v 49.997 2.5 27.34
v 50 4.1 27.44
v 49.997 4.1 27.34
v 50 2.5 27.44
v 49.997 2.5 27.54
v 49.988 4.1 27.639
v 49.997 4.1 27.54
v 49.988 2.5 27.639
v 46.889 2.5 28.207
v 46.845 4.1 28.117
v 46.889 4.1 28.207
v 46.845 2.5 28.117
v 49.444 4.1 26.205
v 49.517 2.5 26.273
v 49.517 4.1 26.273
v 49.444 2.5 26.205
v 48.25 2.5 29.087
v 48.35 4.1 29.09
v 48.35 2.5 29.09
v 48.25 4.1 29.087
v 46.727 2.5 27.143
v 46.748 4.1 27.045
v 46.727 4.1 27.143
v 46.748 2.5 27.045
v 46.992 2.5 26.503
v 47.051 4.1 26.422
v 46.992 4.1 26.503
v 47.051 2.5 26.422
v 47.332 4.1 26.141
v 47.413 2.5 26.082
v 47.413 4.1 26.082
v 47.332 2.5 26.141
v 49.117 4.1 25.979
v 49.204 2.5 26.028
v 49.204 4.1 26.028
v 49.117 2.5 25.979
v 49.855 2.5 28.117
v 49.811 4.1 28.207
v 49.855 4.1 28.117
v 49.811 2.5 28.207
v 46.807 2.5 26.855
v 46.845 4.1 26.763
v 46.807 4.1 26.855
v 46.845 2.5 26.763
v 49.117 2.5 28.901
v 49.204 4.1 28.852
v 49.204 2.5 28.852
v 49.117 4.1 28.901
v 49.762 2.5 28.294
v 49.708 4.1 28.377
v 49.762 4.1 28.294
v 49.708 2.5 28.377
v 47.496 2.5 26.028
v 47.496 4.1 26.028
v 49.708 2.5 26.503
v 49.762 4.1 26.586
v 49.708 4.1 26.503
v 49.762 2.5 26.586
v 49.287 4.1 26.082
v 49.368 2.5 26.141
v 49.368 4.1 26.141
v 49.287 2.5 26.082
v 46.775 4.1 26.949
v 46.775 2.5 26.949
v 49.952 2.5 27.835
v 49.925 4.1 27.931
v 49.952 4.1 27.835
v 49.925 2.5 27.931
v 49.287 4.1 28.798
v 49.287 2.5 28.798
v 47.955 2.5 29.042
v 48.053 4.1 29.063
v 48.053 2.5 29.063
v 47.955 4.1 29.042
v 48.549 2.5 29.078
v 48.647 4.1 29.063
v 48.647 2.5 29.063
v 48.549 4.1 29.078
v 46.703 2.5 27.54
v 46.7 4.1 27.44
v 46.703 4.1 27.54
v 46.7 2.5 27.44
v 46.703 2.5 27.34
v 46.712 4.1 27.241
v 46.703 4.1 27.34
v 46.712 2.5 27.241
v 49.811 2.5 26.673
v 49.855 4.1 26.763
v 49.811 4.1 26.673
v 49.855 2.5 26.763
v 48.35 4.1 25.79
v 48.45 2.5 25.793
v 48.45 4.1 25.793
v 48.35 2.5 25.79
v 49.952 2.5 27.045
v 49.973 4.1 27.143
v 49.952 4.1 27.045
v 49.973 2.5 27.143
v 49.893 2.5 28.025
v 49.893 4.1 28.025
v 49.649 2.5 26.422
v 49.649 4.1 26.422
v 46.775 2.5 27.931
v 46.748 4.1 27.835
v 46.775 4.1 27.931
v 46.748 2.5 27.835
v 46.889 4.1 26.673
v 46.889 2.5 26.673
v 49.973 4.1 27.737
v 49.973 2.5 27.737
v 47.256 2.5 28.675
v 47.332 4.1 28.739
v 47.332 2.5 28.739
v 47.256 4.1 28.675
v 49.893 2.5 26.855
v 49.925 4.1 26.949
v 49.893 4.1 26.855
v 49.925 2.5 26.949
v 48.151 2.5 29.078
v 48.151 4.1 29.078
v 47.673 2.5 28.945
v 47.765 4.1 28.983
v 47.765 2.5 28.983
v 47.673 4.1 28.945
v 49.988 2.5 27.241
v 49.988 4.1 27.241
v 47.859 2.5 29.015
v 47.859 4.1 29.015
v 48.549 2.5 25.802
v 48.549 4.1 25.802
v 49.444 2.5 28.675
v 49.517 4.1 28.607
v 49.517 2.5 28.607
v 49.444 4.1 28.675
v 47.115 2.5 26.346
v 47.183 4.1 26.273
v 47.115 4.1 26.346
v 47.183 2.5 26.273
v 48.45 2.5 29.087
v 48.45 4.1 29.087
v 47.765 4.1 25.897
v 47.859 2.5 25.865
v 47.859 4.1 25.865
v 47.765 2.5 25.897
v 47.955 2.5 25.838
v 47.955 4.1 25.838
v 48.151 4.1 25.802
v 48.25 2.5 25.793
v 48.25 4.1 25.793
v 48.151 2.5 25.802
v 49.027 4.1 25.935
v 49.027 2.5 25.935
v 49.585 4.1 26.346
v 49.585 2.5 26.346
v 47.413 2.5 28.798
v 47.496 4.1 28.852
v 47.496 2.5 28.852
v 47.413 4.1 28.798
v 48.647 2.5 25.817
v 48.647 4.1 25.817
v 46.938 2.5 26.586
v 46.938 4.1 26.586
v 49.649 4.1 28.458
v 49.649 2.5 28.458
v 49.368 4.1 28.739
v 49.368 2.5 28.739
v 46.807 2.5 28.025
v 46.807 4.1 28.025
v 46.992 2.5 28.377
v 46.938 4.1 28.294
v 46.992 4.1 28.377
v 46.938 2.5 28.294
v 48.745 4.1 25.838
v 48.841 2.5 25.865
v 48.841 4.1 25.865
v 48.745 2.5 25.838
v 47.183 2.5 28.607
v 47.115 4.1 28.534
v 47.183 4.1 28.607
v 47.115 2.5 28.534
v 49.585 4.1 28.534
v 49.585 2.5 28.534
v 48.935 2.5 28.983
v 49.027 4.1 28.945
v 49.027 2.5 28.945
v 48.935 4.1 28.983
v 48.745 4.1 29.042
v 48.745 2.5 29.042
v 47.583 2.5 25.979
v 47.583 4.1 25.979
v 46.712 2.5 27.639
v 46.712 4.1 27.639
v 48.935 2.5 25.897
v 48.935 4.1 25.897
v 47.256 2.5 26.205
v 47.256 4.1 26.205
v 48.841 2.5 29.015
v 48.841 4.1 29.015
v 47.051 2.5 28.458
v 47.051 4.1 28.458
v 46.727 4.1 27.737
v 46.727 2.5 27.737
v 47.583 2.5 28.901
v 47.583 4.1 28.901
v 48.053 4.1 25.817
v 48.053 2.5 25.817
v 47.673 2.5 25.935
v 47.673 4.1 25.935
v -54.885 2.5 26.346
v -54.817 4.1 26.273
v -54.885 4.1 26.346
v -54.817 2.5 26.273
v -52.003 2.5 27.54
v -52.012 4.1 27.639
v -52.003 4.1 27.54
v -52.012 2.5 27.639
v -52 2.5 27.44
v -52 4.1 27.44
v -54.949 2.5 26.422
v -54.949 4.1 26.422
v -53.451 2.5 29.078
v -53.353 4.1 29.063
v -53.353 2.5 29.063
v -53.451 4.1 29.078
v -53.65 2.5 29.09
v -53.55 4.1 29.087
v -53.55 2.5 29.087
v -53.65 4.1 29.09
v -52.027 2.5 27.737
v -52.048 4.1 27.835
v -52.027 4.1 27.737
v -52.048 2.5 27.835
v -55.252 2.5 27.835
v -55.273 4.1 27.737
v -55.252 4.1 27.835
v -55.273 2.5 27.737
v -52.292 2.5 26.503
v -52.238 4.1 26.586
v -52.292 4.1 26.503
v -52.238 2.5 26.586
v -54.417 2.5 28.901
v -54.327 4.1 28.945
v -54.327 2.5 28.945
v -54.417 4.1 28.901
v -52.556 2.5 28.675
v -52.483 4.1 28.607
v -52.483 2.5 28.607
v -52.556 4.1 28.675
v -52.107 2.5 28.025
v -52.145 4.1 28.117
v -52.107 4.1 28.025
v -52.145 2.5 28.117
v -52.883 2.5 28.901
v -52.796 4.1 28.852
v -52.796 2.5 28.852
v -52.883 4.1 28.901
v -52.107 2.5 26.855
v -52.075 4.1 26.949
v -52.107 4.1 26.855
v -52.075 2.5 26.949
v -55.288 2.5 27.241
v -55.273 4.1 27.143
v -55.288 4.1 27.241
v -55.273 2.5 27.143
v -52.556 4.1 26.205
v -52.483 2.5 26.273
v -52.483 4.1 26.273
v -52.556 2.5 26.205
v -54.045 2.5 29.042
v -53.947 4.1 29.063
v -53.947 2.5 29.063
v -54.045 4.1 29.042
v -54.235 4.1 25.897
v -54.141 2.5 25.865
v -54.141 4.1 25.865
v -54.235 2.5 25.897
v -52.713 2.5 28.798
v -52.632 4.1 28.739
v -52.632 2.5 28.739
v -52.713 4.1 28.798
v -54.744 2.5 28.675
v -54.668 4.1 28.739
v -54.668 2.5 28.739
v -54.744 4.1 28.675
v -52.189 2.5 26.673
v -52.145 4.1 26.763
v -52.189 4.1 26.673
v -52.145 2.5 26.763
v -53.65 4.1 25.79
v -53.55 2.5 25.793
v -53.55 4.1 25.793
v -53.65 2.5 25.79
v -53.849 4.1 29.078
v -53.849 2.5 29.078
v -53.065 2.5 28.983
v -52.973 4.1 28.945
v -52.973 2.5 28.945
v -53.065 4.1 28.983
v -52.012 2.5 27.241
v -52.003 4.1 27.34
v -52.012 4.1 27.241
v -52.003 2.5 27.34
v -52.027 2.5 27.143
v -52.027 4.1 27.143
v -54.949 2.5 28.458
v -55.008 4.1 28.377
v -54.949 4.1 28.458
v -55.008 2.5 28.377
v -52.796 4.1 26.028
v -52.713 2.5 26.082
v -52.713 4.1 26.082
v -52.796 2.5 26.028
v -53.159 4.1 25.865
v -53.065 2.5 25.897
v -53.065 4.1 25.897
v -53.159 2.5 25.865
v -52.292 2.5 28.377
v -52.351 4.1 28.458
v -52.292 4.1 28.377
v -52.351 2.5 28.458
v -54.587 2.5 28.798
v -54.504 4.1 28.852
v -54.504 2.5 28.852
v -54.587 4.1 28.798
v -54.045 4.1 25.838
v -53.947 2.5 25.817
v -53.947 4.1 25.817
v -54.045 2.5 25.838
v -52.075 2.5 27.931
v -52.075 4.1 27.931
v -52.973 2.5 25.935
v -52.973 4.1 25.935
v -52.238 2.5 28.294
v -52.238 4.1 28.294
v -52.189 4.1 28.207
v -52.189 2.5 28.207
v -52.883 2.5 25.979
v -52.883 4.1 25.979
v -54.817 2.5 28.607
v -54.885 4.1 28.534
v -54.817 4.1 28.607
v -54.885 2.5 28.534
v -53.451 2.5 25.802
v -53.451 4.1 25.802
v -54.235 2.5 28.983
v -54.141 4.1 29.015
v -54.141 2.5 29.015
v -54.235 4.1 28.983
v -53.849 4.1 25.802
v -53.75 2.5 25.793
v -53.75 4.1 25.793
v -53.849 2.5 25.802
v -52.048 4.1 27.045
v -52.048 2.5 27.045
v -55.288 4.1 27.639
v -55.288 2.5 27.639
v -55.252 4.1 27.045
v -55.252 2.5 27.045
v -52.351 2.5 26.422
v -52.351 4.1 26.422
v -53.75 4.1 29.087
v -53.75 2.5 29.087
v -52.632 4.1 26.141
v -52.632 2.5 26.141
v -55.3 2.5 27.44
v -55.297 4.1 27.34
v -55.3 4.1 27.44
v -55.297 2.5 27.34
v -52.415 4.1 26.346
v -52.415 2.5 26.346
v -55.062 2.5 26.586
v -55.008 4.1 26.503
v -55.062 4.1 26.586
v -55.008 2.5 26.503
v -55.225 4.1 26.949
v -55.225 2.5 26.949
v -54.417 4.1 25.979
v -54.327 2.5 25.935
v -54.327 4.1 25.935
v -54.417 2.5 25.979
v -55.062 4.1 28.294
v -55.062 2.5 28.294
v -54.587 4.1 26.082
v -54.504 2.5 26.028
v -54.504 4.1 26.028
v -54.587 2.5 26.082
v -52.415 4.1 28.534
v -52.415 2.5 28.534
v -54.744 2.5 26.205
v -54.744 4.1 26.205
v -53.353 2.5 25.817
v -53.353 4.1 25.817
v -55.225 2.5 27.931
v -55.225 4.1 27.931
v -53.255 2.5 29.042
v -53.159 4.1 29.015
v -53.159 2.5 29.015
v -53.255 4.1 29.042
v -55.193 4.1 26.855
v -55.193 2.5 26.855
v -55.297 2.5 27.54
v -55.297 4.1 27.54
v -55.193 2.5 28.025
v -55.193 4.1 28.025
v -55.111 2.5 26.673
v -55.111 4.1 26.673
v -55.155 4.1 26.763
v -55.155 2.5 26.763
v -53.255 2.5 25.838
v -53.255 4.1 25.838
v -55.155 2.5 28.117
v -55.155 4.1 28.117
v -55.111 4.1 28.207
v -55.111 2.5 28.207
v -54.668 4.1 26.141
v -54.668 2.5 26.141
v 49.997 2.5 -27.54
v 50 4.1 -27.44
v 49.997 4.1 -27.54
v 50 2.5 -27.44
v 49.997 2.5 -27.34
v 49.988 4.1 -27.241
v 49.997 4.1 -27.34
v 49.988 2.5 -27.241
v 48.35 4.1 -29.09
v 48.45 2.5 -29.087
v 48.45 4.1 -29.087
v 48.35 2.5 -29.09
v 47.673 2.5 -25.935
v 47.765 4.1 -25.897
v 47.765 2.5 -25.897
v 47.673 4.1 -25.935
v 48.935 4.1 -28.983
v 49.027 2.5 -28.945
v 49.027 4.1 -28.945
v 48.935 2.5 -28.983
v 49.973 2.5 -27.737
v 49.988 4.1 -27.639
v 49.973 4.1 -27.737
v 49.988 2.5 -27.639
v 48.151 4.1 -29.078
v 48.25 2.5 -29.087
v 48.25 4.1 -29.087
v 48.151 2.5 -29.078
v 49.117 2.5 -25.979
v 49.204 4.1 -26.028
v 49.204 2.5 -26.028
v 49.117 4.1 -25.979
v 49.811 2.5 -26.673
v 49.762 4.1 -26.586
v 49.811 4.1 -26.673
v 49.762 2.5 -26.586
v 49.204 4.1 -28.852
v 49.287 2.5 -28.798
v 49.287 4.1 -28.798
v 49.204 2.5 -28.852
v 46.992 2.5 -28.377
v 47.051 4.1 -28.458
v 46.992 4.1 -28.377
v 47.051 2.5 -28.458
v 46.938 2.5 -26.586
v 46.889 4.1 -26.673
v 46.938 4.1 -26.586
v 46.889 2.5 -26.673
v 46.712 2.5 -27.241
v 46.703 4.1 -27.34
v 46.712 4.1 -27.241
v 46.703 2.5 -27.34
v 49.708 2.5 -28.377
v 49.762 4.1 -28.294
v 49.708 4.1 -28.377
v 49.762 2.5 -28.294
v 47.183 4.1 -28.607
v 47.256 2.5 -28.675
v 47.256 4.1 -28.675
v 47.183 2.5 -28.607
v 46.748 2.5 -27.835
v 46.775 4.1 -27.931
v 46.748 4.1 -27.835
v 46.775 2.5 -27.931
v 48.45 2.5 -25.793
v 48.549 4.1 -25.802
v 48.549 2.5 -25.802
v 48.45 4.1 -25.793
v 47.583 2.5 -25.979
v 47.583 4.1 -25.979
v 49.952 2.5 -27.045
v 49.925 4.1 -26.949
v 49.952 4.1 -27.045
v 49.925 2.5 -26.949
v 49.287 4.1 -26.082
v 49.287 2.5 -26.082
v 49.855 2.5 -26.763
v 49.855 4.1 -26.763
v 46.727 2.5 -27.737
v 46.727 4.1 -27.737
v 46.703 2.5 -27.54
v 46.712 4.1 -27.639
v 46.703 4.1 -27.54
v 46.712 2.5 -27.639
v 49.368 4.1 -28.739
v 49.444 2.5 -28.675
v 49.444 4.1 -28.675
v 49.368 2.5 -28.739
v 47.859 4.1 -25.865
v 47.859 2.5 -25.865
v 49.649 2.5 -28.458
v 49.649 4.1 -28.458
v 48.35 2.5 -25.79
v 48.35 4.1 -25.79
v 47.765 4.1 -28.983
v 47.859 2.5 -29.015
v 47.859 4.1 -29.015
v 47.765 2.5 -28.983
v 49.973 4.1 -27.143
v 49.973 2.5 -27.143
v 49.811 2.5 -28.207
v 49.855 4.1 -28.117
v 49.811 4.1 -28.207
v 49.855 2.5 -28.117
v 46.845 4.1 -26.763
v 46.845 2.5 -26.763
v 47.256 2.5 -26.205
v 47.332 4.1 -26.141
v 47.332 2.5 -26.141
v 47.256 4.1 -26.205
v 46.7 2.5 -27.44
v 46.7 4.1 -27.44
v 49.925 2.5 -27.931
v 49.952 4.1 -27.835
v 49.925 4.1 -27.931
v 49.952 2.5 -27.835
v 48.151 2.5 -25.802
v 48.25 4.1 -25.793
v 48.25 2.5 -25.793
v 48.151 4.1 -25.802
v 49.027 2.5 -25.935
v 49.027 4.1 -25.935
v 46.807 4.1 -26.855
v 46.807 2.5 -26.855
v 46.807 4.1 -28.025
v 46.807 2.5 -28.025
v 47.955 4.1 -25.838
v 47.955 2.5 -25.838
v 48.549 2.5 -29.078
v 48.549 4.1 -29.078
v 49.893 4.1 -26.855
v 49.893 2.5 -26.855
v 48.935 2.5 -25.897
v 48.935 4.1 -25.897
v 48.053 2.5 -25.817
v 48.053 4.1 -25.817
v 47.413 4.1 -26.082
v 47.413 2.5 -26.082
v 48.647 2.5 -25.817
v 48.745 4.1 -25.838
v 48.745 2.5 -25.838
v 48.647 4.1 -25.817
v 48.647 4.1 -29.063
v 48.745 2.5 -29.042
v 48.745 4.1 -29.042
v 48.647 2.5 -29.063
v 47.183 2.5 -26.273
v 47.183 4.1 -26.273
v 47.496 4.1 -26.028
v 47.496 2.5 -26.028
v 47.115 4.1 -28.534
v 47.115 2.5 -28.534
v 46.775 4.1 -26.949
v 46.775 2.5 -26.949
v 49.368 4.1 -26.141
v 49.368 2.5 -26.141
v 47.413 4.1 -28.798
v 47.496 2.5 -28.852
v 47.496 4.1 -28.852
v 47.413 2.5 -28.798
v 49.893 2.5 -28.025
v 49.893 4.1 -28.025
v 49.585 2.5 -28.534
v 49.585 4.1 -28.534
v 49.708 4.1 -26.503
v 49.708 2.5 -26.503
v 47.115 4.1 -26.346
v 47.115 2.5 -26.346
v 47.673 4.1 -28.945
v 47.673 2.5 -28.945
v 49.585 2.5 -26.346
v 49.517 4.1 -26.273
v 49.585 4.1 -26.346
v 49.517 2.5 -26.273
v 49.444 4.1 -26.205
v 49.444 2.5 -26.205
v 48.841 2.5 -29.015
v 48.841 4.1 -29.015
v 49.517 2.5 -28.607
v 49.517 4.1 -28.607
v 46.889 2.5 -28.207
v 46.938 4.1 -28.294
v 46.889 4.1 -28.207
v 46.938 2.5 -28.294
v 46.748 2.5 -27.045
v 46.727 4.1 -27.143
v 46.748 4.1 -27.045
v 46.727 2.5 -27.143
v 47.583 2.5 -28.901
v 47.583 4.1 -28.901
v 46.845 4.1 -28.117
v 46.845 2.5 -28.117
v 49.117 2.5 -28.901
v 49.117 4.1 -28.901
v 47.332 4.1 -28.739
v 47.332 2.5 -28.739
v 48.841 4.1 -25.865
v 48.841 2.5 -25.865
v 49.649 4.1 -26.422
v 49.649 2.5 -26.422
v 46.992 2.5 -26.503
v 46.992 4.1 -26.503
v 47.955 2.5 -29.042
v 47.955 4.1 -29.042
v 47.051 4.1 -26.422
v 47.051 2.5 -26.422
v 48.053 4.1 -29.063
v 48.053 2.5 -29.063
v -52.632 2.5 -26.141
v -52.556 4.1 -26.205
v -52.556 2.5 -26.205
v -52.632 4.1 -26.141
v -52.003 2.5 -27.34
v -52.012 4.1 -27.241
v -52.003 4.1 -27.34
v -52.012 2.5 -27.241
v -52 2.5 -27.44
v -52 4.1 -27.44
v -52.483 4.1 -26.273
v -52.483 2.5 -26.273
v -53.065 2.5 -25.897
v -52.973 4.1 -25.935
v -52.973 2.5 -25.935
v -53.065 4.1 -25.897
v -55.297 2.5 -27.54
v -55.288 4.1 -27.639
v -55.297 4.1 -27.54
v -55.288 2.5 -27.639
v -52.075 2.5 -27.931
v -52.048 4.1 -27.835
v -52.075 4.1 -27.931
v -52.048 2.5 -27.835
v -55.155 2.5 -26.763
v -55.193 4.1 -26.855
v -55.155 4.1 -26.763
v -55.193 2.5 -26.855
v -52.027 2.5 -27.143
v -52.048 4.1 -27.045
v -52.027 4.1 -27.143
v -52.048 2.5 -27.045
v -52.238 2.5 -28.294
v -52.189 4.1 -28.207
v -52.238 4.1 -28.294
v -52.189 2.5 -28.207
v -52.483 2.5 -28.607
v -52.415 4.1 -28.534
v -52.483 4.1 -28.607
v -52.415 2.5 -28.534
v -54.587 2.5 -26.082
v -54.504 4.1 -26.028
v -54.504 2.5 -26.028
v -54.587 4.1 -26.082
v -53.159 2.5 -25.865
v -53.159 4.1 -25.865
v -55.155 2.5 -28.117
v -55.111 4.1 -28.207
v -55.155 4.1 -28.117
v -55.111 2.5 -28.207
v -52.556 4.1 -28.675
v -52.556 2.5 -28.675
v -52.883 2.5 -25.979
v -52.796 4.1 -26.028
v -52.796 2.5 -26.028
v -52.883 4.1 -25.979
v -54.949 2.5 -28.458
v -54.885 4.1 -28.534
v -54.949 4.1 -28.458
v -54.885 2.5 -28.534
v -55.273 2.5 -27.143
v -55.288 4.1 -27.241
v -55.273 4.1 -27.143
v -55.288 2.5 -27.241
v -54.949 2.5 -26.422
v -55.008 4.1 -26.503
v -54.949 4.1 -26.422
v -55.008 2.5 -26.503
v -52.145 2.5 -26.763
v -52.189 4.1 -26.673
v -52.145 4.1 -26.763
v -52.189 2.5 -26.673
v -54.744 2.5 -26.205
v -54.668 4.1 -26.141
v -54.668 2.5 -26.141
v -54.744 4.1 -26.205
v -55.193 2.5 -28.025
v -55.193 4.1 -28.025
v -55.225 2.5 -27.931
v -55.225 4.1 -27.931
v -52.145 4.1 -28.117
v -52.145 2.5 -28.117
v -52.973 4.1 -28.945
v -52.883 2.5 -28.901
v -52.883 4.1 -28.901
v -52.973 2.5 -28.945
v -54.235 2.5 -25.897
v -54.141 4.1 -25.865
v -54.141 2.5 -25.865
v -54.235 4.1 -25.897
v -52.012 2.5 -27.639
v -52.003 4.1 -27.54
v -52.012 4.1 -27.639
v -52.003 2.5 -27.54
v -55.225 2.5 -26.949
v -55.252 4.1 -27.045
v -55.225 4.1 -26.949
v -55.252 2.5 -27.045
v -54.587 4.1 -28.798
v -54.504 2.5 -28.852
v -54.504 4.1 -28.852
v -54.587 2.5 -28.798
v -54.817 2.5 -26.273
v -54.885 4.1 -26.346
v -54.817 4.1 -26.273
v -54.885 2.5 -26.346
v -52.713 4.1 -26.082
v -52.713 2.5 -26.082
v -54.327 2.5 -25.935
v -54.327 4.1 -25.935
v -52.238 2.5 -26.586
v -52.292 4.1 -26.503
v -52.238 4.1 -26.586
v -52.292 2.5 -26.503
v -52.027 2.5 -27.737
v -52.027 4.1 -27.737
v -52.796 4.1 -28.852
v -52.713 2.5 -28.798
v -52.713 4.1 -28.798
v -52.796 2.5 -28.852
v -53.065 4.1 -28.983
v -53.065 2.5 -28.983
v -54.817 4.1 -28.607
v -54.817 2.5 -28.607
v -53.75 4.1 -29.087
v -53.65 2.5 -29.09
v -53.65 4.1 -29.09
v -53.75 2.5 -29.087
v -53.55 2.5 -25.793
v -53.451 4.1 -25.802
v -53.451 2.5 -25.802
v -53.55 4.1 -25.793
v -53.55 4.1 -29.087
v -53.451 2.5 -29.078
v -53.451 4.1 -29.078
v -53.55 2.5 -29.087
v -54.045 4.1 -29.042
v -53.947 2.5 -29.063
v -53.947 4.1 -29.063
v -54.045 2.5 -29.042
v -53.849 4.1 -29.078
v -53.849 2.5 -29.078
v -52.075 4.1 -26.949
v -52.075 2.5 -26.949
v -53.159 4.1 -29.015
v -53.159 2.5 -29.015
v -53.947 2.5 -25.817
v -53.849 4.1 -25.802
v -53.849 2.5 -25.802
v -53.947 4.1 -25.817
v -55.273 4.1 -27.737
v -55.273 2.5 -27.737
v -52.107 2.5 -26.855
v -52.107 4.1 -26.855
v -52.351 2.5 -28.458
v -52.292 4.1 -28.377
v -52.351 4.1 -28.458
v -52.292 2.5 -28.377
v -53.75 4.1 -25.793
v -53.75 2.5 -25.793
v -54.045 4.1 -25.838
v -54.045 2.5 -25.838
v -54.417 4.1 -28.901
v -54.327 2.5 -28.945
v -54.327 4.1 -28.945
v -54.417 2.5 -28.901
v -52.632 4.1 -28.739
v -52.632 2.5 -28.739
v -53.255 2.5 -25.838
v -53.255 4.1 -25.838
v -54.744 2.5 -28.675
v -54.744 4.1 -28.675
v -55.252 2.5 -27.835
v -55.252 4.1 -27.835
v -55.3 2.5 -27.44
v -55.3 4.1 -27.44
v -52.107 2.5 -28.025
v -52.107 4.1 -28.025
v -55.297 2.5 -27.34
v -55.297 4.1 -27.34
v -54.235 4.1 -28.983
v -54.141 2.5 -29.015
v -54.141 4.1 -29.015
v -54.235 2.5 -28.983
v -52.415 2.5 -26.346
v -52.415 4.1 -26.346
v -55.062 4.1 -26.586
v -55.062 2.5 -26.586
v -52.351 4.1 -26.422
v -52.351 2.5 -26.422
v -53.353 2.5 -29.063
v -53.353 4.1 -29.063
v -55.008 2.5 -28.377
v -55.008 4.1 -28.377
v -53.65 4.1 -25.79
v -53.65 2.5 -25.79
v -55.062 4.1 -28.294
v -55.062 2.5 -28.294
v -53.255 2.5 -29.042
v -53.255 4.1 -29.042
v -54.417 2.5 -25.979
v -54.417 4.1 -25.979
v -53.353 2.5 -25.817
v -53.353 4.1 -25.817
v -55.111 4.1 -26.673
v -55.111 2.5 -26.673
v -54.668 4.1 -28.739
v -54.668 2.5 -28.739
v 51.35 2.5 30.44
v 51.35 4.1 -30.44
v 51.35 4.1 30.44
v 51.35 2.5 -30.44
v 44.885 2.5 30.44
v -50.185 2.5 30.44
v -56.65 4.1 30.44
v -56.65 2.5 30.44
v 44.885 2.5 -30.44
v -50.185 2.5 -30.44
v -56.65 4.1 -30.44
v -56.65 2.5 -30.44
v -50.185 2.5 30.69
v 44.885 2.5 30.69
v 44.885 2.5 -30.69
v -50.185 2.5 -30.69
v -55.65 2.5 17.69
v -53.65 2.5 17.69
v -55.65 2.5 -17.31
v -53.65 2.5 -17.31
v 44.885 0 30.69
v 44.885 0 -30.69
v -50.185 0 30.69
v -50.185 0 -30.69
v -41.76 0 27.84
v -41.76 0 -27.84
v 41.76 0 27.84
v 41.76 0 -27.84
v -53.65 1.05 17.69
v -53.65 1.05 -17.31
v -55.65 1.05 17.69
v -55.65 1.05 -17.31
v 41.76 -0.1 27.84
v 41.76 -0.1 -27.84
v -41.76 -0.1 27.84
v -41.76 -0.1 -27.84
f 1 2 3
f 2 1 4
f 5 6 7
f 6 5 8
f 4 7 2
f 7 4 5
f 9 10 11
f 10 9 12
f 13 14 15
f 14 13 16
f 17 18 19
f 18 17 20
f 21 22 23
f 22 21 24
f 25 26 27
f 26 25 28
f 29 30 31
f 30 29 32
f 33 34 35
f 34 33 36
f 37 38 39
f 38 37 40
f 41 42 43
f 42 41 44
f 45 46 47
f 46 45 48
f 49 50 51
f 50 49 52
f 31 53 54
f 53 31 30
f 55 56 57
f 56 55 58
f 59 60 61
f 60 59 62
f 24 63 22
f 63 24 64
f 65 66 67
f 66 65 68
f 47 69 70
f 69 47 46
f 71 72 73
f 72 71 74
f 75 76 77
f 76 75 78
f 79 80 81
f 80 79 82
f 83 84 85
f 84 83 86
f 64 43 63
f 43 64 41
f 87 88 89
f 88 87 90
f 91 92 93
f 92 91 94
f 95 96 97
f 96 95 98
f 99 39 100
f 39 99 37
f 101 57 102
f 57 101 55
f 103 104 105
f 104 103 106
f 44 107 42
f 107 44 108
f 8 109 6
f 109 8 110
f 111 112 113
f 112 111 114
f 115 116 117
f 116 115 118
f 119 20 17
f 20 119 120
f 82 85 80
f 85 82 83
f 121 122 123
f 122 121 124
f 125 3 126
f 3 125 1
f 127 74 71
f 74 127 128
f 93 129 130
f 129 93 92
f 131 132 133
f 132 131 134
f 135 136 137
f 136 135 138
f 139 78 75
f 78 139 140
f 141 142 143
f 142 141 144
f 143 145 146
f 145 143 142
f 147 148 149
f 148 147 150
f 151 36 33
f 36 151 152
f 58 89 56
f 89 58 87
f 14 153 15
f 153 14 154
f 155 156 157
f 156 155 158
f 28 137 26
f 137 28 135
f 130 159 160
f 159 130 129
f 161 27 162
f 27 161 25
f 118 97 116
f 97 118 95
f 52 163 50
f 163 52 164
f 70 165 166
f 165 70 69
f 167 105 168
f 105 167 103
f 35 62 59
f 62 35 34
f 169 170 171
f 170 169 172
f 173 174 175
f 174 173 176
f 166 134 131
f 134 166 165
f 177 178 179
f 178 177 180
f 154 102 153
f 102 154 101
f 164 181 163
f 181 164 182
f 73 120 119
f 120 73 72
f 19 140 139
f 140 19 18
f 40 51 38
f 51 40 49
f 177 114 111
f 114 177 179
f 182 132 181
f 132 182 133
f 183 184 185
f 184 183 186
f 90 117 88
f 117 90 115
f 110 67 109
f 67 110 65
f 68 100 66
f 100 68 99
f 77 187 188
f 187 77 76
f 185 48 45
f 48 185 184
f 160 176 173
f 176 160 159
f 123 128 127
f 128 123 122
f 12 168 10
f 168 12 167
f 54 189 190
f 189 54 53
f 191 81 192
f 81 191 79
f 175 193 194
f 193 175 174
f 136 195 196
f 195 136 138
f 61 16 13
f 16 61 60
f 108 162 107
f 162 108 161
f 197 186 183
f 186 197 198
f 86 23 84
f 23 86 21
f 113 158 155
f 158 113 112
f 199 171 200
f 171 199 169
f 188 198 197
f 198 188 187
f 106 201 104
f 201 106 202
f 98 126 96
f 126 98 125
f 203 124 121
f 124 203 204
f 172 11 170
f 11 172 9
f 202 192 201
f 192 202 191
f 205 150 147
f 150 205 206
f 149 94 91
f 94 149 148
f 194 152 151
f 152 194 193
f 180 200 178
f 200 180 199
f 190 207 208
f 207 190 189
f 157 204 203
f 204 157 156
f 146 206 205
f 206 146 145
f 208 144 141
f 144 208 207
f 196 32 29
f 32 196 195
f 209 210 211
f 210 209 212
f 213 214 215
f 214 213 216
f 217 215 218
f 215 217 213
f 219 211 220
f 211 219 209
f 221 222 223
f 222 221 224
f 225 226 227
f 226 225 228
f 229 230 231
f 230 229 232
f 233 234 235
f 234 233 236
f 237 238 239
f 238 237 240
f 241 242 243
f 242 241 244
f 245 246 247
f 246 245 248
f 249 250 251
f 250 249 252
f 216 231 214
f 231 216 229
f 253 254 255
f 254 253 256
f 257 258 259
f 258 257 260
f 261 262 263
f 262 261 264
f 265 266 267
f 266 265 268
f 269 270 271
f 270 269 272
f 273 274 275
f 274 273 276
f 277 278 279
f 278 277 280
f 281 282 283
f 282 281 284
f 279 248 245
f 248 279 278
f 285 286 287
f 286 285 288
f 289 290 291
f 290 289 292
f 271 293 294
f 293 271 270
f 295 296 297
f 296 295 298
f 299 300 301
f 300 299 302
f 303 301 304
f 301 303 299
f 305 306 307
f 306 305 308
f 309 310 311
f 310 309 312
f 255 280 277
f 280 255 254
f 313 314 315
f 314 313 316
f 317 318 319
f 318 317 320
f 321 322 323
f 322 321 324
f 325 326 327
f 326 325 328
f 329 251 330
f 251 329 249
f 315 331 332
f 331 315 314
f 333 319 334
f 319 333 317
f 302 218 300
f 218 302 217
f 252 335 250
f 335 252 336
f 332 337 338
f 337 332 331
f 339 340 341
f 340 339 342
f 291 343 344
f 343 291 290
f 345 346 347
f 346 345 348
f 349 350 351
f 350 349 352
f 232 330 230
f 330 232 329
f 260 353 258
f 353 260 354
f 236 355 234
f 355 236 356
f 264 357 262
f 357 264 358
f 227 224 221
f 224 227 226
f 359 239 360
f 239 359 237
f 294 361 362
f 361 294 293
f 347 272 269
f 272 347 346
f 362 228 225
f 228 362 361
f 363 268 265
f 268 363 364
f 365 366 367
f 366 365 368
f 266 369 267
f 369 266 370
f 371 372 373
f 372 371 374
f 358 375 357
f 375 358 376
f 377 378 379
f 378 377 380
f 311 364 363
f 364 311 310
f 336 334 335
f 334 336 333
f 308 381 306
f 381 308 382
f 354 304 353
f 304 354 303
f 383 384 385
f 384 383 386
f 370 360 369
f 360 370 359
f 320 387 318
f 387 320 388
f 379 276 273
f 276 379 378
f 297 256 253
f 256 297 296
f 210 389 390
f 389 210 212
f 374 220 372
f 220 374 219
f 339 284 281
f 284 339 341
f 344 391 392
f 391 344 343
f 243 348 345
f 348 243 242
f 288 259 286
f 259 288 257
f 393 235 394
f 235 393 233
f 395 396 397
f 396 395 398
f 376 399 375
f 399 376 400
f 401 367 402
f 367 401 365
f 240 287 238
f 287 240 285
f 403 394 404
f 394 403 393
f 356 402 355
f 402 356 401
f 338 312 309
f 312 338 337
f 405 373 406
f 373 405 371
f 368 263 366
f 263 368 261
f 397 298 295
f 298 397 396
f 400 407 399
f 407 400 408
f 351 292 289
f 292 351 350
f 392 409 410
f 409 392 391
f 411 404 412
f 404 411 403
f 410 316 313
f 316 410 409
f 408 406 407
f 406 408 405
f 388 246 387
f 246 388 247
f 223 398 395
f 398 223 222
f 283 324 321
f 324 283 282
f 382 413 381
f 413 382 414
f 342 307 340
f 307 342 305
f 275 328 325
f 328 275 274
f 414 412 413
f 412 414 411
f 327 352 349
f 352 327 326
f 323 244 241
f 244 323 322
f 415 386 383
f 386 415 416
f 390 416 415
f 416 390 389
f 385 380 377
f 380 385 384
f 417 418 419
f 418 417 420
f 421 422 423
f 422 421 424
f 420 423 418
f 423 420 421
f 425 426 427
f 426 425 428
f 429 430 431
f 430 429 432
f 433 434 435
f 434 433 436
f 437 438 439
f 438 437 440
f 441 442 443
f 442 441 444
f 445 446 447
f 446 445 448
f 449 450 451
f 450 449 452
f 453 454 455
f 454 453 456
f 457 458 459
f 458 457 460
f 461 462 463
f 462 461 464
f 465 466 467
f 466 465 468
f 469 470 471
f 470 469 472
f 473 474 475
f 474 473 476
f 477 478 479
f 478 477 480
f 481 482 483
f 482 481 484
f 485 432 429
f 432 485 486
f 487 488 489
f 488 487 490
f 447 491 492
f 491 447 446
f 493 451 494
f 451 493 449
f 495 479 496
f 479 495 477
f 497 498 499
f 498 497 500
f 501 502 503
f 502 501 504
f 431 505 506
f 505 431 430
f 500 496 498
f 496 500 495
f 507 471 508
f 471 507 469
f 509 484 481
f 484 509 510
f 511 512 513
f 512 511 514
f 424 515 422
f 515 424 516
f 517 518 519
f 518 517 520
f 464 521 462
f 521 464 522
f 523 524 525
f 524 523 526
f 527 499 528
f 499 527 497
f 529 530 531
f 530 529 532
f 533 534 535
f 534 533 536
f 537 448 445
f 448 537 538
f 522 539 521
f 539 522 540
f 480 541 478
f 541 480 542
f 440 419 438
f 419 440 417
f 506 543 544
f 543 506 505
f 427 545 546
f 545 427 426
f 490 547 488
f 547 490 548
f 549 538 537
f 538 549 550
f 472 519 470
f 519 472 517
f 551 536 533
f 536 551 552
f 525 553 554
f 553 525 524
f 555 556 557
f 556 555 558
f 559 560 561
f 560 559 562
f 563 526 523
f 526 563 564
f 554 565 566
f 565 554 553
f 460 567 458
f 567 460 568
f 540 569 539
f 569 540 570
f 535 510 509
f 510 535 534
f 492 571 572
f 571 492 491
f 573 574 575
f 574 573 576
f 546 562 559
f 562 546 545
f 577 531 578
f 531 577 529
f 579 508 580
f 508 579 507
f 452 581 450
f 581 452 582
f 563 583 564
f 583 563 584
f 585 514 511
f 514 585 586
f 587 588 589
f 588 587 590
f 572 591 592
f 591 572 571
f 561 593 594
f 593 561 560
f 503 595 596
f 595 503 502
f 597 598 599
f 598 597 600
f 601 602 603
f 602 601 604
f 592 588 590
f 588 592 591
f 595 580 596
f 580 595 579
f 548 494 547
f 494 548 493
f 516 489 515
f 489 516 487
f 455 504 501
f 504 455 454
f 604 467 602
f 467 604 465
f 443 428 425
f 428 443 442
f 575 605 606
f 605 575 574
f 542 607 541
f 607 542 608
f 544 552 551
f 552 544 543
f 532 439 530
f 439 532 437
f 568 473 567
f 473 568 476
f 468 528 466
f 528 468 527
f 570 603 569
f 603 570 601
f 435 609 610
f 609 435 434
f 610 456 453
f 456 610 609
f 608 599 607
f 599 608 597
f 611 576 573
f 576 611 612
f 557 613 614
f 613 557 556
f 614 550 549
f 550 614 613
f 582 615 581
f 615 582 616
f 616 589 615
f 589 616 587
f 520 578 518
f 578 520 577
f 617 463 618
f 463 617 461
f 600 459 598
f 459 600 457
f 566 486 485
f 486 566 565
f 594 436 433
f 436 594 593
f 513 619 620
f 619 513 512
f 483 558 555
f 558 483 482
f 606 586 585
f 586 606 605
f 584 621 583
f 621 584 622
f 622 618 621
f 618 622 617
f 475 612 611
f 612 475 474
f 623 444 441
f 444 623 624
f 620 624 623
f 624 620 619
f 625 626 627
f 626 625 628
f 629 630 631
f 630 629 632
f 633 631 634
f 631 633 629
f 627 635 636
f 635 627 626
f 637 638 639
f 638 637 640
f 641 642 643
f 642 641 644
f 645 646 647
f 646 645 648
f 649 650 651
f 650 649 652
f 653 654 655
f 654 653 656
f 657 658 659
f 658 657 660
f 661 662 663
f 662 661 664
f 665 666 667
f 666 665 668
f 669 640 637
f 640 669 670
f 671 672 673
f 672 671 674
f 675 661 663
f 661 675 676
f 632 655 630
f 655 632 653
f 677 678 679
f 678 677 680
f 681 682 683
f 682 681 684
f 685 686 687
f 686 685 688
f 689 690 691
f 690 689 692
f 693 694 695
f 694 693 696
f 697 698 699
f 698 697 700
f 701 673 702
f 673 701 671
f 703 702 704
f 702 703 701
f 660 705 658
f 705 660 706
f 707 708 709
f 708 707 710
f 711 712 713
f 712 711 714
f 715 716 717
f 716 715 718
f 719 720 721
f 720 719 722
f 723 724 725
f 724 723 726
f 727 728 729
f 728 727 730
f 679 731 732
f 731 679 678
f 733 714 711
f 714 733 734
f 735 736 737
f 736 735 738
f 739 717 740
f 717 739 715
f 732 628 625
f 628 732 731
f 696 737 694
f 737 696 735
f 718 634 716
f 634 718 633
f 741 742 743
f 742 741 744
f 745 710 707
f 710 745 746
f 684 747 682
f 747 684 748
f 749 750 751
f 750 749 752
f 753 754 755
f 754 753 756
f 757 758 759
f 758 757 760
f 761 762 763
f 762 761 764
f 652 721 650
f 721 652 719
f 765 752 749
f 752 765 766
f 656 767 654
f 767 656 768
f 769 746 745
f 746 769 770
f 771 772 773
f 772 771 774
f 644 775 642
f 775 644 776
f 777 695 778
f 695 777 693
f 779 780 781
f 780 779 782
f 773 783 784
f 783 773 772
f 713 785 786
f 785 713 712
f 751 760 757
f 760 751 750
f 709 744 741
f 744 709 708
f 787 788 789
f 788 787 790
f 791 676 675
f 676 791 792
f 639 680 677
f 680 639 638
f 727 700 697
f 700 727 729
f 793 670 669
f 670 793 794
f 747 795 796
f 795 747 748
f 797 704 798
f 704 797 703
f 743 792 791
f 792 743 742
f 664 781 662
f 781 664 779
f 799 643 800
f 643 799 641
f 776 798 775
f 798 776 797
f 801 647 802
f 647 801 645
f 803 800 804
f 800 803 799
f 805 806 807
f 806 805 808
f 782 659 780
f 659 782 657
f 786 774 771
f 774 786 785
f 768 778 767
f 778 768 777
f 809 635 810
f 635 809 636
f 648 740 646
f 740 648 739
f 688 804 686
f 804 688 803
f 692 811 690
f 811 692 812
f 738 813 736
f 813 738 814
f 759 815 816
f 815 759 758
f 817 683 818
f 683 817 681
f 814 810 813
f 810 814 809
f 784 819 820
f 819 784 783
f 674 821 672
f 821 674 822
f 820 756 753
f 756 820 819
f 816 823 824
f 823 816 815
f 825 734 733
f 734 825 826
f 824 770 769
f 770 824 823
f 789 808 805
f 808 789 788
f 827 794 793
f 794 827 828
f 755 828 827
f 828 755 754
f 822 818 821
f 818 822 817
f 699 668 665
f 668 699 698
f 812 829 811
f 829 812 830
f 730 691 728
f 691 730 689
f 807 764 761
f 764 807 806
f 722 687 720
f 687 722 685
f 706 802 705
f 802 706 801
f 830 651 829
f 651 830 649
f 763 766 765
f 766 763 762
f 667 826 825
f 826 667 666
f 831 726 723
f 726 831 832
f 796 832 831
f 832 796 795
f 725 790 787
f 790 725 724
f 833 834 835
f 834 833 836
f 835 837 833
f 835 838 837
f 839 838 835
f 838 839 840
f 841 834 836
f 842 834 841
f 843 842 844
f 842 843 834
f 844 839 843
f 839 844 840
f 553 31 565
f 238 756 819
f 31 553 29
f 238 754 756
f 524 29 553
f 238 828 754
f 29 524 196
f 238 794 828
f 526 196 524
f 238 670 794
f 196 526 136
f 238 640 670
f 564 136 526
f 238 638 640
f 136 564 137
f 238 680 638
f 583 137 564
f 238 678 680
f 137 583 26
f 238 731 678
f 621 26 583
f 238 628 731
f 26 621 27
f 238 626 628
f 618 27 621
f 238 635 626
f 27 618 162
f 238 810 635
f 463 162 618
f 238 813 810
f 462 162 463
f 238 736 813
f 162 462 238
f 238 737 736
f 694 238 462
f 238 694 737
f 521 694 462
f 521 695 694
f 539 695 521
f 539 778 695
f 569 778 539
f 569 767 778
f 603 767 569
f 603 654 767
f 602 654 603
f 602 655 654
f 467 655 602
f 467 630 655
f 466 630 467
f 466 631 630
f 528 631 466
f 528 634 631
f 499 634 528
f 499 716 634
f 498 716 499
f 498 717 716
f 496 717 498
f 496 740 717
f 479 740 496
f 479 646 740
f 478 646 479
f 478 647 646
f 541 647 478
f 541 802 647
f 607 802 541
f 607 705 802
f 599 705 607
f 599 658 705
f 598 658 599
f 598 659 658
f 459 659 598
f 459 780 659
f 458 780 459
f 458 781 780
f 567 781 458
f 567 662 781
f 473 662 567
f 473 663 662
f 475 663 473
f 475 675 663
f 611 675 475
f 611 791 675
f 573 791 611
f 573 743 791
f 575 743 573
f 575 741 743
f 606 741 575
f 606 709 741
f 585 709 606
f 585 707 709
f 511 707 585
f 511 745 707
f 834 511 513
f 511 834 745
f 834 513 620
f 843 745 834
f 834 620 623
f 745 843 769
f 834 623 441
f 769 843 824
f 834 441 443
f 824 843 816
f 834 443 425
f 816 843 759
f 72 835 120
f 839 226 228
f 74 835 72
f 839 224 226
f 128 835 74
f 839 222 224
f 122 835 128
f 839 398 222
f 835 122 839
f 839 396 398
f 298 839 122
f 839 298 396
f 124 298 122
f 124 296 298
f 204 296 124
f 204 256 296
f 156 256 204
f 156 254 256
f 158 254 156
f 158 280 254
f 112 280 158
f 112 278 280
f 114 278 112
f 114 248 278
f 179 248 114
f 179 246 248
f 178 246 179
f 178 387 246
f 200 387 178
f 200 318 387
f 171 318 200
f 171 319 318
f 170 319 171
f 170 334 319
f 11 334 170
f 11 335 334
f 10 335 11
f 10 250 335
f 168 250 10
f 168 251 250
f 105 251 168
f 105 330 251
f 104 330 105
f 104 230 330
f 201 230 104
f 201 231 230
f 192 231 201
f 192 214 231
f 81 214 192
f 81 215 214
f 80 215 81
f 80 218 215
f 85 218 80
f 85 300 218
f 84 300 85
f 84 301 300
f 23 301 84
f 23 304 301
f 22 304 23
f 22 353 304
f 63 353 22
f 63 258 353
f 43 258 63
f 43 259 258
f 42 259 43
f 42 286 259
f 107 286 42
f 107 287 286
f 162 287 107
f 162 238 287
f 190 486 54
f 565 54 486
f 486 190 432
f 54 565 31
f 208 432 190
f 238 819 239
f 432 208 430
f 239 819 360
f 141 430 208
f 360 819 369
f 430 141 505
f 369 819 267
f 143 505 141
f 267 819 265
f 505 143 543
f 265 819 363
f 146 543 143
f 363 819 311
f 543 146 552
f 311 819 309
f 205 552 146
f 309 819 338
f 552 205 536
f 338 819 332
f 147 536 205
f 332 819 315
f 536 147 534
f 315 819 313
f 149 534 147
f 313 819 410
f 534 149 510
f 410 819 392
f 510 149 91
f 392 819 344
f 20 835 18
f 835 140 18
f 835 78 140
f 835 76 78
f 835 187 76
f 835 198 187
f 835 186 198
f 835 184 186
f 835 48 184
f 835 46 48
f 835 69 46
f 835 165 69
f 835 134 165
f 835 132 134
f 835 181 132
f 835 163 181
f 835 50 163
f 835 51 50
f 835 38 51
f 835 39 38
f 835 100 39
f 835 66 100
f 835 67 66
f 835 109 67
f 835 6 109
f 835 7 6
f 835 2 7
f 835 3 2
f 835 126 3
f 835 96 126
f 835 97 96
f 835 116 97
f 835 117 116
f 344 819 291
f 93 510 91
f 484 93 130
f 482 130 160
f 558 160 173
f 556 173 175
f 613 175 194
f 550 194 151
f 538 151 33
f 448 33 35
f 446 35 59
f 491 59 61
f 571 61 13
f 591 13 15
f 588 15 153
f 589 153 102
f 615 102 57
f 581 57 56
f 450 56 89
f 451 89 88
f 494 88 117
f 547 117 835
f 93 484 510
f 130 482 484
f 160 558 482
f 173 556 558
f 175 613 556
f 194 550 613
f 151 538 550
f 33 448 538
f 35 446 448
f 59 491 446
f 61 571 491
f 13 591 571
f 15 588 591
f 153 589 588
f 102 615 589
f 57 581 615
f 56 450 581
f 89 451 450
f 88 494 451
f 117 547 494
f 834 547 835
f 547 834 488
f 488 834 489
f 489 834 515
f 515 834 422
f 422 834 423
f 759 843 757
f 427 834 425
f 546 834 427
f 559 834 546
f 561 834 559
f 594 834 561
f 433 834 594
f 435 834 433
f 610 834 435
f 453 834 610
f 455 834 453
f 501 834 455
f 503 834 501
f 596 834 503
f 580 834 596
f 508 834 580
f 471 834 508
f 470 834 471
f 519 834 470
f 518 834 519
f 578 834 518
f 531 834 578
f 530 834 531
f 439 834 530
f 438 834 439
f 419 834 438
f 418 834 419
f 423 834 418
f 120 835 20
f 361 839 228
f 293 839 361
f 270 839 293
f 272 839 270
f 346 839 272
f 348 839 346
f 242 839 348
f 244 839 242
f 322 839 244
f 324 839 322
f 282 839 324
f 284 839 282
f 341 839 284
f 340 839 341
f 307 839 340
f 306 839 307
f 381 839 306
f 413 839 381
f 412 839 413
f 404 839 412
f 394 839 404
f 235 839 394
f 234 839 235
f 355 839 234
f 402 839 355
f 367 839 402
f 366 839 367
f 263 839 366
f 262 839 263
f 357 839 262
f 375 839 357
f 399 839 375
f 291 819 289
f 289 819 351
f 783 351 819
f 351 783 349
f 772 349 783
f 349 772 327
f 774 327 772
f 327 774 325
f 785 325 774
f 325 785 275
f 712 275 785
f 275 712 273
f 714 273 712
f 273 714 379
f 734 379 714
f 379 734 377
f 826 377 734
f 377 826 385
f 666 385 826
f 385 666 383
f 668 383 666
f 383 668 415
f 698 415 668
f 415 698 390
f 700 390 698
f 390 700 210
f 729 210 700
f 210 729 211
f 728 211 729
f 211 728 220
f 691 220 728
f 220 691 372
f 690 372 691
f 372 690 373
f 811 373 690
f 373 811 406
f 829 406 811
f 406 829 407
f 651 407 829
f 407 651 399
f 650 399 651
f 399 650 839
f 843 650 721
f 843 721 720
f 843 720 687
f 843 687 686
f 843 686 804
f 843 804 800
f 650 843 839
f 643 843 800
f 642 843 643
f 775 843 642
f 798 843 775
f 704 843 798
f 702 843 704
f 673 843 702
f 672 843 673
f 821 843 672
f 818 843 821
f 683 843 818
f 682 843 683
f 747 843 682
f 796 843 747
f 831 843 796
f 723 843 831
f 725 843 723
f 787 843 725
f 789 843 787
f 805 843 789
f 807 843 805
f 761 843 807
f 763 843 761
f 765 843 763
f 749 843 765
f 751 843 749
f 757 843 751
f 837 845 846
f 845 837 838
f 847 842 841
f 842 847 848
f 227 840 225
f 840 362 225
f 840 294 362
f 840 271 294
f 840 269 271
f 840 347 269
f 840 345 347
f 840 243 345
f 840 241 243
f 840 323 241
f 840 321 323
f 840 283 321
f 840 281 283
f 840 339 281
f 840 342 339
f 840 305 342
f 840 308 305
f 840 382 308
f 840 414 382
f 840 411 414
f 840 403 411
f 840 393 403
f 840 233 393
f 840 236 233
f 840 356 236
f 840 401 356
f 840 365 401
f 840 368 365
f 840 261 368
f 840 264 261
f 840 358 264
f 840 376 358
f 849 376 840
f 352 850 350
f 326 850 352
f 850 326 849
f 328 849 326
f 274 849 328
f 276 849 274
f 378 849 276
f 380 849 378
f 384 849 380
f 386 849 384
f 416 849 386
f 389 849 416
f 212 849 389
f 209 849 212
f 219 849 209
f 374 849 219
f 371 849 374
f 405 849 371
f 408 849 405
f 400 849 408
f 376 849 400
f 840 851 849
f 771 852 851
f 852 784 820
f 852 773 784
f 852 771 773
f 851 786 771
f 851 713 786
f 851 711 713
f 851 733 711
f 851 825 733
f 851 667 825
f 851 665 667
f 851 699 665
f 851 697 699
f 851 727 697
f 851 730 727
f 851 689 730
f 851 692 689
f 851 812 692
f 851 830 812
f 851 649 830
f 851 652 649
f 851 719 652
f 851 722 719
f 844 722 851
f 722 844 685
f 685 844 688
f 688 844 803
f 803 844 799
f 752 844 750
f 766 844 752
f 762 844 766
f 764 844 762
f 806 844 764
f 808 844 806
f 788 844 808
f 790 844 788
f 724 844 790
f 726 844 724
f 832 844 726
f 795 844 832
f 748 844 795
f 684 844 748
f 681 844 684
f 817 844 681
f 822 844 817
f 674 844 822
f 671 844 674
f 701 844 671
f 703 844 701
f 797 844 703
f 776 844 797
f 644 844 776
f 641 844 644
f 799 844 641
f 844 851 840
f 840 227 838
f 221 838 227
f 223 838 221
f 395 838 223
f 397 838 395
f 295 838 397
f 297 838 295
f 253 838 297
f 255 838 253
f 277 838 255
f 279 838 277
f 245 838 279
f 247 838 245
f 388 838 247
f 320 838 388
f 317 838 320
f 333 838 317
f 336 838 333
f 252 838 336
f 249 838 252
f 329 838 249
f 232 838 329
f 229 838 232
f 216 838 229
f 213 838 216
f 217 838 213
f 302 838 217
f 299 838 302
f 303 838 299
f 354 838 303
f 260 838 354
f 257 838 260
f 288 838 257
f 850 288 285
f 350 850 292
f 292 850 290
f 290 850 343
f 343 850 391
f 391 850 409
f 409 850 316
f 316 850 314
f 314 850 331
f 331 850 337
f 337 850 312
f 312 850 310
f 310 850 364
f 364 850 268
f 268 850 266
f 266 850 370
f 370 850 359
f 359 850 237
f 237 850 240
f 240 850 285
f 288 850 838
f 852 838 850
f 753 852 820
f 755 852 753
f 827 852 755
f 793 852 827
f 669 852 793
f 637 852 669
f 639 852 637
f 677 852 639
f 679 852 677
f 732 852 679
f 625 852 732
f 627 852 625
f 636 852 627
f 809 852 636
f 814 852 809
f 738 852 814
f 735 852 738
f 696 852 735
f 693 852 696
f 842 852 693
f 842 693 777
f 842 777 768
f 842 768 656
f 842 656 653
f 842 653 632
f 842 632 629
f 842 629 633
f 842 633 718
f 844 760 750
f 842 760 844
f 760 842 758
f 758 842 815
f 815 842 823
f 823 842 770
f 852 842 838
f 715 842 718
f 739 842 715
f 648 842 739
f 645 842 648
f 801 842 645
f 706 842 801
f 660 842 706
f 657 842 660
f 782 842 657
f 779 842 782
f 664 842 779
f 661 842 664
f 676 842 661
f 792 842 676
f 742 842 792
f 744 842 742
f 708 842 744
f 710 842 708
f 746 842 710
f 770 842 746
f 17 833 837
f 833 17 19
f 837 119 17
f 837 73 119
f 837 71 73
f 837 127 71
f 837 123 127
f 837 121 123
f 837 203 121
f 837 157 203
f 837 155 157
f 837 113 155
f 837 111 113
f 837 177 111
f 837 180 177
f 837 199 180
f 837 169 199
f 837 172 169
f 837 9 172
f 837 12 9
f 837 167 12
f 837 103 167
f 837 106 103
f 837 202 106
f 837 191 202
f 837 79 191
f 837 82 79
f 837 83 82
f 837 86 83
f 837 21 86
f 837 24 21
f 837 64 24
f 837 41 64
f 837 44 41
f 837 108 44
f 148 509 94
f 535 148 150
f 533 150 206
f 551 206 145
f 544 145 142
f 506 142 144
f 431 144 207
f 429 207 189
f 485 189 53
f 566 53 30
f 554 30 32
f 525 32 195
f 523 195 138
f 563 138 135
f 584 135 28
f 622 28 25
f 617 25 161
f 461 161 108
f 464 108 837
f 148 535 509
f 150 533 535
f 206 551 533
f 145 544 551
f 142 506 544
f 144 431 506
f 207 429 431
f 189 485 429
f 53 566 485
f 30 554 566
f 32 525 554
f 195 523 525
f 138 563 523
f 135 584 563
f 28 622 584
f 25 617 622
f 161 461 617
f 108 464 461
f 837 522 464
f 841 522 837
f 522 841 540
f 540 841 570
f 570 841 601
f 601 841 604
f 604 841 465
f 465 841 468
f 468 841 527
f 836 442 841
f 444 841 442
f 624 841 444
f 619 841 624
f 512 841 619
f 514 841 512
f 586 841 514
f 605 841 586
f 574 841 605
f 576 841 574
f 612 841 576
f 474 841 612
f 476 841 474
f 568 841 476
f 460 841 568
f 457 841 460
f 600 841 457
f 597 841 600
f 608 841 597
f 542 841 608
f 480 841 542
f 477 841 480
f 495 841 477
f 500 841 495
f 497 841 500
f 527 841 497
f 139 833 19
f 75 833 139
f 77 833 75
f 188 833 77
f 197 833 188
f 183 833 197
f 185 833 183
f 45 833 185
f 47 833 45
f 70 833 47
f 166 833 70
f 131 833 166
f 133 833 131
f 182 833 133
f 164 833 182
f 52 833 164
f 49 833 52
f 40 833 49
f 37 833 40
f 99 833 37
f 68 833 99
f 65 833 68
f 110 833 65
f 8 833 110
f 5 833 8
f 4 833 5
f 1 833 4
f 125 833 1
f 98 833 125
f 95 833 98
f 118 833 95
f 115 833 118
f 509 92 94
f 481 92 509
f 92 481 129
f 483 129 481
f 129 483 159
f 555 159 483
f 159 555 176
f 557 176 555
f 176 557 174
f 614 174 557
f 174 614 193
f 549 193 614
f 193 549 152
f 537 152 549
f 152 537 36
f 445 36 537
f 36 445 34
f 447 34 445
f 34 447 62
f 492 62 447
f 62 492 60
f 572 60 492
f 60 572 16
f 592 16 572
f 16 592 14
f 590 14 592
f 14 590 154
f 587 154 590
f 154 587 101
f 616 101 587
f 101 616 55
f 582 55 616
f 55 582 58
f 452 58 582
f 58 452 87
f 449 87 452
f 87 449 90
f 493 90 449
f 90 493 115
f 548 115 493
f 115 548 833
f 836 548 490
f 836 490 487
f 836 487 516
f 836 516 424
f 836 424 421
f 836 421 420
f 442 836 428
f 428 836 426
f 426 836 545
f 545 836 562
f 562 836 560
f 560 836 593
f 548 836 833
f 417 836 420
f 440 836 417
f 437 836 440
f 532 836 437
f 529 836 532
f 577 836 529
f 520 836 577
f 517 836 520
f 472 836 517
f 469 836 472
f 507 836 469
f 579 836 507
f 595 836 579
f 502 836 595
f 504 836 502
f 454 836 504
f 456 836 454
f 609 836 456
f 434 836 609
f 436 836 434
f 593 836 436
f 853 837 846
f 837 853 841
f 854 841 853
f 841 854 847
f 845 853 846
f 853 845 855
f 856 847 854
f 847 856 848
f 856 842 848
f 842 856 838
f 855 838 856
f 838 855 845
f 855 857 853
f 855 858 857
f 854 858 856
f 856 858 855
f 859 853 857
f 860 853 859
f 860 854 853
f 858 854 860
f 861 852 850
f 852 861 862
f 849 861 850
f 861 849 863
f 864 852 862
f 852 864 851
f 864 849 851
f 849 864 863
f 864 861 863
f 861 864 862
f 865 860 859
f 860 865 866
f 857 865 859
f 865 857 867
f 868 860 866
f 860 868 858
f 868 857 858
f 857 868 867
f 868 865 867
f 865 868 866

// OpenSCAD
// file: metrichardware.scad
/*=============================================================================

  Model of Metric hardware

  (c) David Annett
  9 August 2022

  The value MxPass is for a hole that is big enough for a Mx part to pass thru
  
  The value MxTap is for a hole that is small enough to have a thread tapped
  for a Mx part.  For screws below M3 an insert will be needed instead of a tap.
  
  The function MxPillar creates a mount pillar with a hole for a threaded insert
  be inserted under presure.
 
=============================================================================*/

// Imported modules

//use <SomeLibrary.scad>;

/*-----------------------------------------------------------------------------

  Hole sizes

  Pass   - Size to pass bolt through easily with little gap
  Tap    - Size to tap a thread into with thread cutting tool
  Insert - Size to hole a threaded brass insert

-----------------------------------------------------------------------------*/

M2Pass              =  2.3;
M2Insert            =  3.4;
M2PillarLength      =  3;
M2PillarDiameter    =  5;

M2_5Pass            =  2.8;
M2_5Insert          =  3.4;
M2_5PillarLength    =  3;
M2_5PillarDiameter  =  5;

M3Pass              =  3.3;
M3Tap               =  2.5;
M3Insert            =  3.9;
M3PillarLength      =  4.9;
M3PillarDiameter    =  6.5;
M3RoundHead         =  5.3;
M3RoundHeadPass     =  5.5;

M4Pass              =  4.4;

M5Pass              =  5.5;

VESA75Spacing       = 75;
VESA75Pass          = M4Pass;

VESA100Spacing      = 100;
VESA100Pass         = M4Pass;

MOverlap            =  0.1;


module M2Pillar (
  Height
  )
{
  difference() {
      cylinder(h = Height + MOverlap, d = M2PillarDiameter, center = true);
    
      // Insert hole

      translate([0, 0, MOverlap])
          cylinder(h = Height, d = M2Insert, center = true);
    
      // Insert lead in
  
      translate([0, 0, MOverlap + Height / 2 - 0.5])
        cylinder(h = 0.5, d = M2Insert + 0.4, center = true);
  }
}


module M2_5Pillar (
  Height
  )
{
  difference() {
      cylinder(h = Height + MOverlap, d = M2_5PillarDiameter, center = true);
    
      // Insert hole

      translate([0, 0, MOverlap])
          cylinder(h = Height, d = M2_5Insert, center = true);
    
      // Insert lead in
  
      translate([0, 0, MOverlap + Height / 2 - 0.5])
        cylinder(h = 0.5, d = M2_5Insert + 0.4, center = true);
  }
}


module M3Pillar (
  Height
  )
{
  difference() {
      cylinder(h = Height + MOverlap, d = M3PillarDiameter, center = true);
    
      // Insert hole

      translate([0, 0, MOverlap])
          cylinder(h = Height, d = M3Insert, center = true);
    
      // Insert lead in

      translate([0, 0, MOverlap + Height / 2 - 0.5])
        cylinder(h = 0.5, d = M3Insert + 0.4, center = true);
  }
}


/*
  VESA 75 pass holes
  Centered on center of pattern, projects in -Y direction
*/
module VESA75Holes (
  Depth
)
{
  translate([VESA75Spacing/2, Depth/-2, VESA75Spacing/2])
  rotate([90, 0 , 0])
    cylinder(h = Depth, d = VESA75Pass, center = true);

  translate([VESA75Spacing/2, Depth/-2, VESA75Spacing/-2])
  rotate([90, 0 , 0])
    cylinder(h = Depth, d = VESA75Pass, center = true);

  translate([VESA75Spacing/-2, Depth/-2, VESA75Spacing/2])
  rotate([90, 0 , 0])
    cylinder(h = Depth, d = VESA75Pass, center = true);

  translate([VESA75Spacing/-2, Depth/-2, VESA75Spacing/-2])
  rotate([90, 0 , 0])
    cylinder(h = Depth, d = VESA75Pass, center = true);
}
// main file
/*=================================================

  Colour 4" LCD module - MSP4030 variant (blue PCB)

  (c) David Annett
  17 Mar 2026

  The reference point for everythimg is the front
  face of the panel centered on the active image
  area.

=================================================*/

// Imported modules

include <metrichardware.scad>;

// Control rendering quality

$fa = 1;
$fs = 0.1;
Overlap = 0.05;
showsample = true;


// Major dimensions

4_LCDWidth          = 108;    // X - Width of LCD PCB
4_LCDHeight         =  60.88; // Z - Height of LCD PCB
4_LCDXPCBOffset     =   2.65; // X
4_LCDMountOffset    =   3;    // XZ - Offset for mounting holes from corner
4_LCDPCBDepth       =   1.6;  // Y - PCB thickness

4_LCDPanelWidth     =  95.07; // X Added 0.5mm for cutout clearance
4_LCDPanelDepth     =   2.5;  // Y Depth of actual panel
4_LCDPanelHeight    =  61.38; // Z Added 0.5mm for cutout clearance
4_LCDXPanelOffset   =   2.65; // X Panel shift to the right

4_LCDActiveWidth    =  83.52; // X 
4_LCDActiveHeight   =  55.68; // Z 

4_LCDPinsWidth      =   2;    // X
4_LCDPinsHeight     =  35;    // Z
4_LCDPinsDepth      =   1.5;  // Y
4_LCDPinsLeftOffset =   1;    // X To edge of pins, not center
4_LCDPinsTopOffset  =  13;    // Z To edge of pins, not center


// Derived dimemsions

4_LCDDepth = 4_LCDPanelDepth + 4_LCDPCBDepth; // Y - Panel face to PCB rear 



module 4_LCDModuleActiveCutout(depth)
{
  translate([0, depth/-2, 0])
    cube([4_LCDActiveWidth,
          depth + Overlap * 2,
          4_LCDActiveHeight],
          center = true);
}



module 4_LCDModuleHountHoles(depth)
{
  fdepth = depth + Overlap * 2;
  translate([4_LCDWidth/2 - 4_LCDMountOffset - 4_LCDXPanelOffset,
             0,
             4_LCDHeight/2 - 4_LCDMountOffset])
  rotate([90, 0, 0])
    cylinder(fdepth, d=M3Pass, center = true);

  translate([4_LCDWidth/-2 + 4_LCDMountOffset - 4_LCDXPanelOffset,
             0,
             4_LCDHeight/2 - 4_LCDMountOffset])
  rotate([90, 0, 0])
    cylinder(fdepth, d=M3Pass, center = true);

  translate([4_LCDWidth/2 - 4_LCDMountOffset - 4_LCDXPanelOffset,
             0,
             4_LCDHeight/-2 + 4_LCDMountOffset])
  rotate([90, 0, 0])
    cylinder(fdepth, d=M3Pass, center = true);

  translate([4_LCDWidth/-2 + 4_LCDMountOffset- 4_LCDXPanelOffset,
             0,
             4_LCDHeight/-2 + 4_LCDMountOffset])
  rotate([90, 0, 0])
    cylinder(fdepth, d=M3Pass, center = true);
}




// === The LCD display ===

// Show module in place, centered on front face of active area
module 4_LCDModule(
  colour = "red"
  )
{
  // PCB
  
  color(colour)
    difference() {
      translate([-(4_LCDXPCBOffset),
                 4_LCDPanelDepth + 4_LCDPCBDepth / 2,
                 0])
        cube([4_LCDWidth,
              4_LCDPCBDepth,
              4_LCDHeight],
             center = true);
      
      translate([0,
                 4_LCDPanelDepth + 4_LCDPCBDepth / 2,
                 0])
        4_LCDModuleHountHoles(4_LCDPCBDepth);
    }

  // Panel
  
  color(colour)
  translate([-(4_LCDXPanelOffset),
             4_LCDPanelDepth / 2,
             0])
    cube([4_LCDPanelWidth,
          4_LCDPanelDepth,
          4_LCDPanelHeight],
         center = true);

  // Connector pins
    
  color(colour)
  translate([(4_LCDWidth / -2 - 4_LCDXPCBOffset + 4_LCDPinsWidth / 2 + 4_LCDPinsLeftOffset),
             4_LCDPinsDepth / -2 + 4_LCDPanelDepth + Overlap,
             4_LCDPanelHeight / 2 - 4_LCDPinsHeight / 2 - 4_LCDPinsTopOffset])
    cube([4_LCDPinsWidth,
          4_LCDPinsDepth,
          4_LCDPinsHeight],
         center = true);


  // Active area

  color("black")
  translate([0,
             -0.05,
             0])
    cube([4_LCDActiveWidth,
          0.1,
          4_LCDActiveHeight],
         center = true);
}


// === Show samples ===

if (showsample) {
  4_LCDModule();
}
//4_LCDModuleActiveCutout(2);
//4_LCDModuleHountHoles(4_LCDPCBDepth);
